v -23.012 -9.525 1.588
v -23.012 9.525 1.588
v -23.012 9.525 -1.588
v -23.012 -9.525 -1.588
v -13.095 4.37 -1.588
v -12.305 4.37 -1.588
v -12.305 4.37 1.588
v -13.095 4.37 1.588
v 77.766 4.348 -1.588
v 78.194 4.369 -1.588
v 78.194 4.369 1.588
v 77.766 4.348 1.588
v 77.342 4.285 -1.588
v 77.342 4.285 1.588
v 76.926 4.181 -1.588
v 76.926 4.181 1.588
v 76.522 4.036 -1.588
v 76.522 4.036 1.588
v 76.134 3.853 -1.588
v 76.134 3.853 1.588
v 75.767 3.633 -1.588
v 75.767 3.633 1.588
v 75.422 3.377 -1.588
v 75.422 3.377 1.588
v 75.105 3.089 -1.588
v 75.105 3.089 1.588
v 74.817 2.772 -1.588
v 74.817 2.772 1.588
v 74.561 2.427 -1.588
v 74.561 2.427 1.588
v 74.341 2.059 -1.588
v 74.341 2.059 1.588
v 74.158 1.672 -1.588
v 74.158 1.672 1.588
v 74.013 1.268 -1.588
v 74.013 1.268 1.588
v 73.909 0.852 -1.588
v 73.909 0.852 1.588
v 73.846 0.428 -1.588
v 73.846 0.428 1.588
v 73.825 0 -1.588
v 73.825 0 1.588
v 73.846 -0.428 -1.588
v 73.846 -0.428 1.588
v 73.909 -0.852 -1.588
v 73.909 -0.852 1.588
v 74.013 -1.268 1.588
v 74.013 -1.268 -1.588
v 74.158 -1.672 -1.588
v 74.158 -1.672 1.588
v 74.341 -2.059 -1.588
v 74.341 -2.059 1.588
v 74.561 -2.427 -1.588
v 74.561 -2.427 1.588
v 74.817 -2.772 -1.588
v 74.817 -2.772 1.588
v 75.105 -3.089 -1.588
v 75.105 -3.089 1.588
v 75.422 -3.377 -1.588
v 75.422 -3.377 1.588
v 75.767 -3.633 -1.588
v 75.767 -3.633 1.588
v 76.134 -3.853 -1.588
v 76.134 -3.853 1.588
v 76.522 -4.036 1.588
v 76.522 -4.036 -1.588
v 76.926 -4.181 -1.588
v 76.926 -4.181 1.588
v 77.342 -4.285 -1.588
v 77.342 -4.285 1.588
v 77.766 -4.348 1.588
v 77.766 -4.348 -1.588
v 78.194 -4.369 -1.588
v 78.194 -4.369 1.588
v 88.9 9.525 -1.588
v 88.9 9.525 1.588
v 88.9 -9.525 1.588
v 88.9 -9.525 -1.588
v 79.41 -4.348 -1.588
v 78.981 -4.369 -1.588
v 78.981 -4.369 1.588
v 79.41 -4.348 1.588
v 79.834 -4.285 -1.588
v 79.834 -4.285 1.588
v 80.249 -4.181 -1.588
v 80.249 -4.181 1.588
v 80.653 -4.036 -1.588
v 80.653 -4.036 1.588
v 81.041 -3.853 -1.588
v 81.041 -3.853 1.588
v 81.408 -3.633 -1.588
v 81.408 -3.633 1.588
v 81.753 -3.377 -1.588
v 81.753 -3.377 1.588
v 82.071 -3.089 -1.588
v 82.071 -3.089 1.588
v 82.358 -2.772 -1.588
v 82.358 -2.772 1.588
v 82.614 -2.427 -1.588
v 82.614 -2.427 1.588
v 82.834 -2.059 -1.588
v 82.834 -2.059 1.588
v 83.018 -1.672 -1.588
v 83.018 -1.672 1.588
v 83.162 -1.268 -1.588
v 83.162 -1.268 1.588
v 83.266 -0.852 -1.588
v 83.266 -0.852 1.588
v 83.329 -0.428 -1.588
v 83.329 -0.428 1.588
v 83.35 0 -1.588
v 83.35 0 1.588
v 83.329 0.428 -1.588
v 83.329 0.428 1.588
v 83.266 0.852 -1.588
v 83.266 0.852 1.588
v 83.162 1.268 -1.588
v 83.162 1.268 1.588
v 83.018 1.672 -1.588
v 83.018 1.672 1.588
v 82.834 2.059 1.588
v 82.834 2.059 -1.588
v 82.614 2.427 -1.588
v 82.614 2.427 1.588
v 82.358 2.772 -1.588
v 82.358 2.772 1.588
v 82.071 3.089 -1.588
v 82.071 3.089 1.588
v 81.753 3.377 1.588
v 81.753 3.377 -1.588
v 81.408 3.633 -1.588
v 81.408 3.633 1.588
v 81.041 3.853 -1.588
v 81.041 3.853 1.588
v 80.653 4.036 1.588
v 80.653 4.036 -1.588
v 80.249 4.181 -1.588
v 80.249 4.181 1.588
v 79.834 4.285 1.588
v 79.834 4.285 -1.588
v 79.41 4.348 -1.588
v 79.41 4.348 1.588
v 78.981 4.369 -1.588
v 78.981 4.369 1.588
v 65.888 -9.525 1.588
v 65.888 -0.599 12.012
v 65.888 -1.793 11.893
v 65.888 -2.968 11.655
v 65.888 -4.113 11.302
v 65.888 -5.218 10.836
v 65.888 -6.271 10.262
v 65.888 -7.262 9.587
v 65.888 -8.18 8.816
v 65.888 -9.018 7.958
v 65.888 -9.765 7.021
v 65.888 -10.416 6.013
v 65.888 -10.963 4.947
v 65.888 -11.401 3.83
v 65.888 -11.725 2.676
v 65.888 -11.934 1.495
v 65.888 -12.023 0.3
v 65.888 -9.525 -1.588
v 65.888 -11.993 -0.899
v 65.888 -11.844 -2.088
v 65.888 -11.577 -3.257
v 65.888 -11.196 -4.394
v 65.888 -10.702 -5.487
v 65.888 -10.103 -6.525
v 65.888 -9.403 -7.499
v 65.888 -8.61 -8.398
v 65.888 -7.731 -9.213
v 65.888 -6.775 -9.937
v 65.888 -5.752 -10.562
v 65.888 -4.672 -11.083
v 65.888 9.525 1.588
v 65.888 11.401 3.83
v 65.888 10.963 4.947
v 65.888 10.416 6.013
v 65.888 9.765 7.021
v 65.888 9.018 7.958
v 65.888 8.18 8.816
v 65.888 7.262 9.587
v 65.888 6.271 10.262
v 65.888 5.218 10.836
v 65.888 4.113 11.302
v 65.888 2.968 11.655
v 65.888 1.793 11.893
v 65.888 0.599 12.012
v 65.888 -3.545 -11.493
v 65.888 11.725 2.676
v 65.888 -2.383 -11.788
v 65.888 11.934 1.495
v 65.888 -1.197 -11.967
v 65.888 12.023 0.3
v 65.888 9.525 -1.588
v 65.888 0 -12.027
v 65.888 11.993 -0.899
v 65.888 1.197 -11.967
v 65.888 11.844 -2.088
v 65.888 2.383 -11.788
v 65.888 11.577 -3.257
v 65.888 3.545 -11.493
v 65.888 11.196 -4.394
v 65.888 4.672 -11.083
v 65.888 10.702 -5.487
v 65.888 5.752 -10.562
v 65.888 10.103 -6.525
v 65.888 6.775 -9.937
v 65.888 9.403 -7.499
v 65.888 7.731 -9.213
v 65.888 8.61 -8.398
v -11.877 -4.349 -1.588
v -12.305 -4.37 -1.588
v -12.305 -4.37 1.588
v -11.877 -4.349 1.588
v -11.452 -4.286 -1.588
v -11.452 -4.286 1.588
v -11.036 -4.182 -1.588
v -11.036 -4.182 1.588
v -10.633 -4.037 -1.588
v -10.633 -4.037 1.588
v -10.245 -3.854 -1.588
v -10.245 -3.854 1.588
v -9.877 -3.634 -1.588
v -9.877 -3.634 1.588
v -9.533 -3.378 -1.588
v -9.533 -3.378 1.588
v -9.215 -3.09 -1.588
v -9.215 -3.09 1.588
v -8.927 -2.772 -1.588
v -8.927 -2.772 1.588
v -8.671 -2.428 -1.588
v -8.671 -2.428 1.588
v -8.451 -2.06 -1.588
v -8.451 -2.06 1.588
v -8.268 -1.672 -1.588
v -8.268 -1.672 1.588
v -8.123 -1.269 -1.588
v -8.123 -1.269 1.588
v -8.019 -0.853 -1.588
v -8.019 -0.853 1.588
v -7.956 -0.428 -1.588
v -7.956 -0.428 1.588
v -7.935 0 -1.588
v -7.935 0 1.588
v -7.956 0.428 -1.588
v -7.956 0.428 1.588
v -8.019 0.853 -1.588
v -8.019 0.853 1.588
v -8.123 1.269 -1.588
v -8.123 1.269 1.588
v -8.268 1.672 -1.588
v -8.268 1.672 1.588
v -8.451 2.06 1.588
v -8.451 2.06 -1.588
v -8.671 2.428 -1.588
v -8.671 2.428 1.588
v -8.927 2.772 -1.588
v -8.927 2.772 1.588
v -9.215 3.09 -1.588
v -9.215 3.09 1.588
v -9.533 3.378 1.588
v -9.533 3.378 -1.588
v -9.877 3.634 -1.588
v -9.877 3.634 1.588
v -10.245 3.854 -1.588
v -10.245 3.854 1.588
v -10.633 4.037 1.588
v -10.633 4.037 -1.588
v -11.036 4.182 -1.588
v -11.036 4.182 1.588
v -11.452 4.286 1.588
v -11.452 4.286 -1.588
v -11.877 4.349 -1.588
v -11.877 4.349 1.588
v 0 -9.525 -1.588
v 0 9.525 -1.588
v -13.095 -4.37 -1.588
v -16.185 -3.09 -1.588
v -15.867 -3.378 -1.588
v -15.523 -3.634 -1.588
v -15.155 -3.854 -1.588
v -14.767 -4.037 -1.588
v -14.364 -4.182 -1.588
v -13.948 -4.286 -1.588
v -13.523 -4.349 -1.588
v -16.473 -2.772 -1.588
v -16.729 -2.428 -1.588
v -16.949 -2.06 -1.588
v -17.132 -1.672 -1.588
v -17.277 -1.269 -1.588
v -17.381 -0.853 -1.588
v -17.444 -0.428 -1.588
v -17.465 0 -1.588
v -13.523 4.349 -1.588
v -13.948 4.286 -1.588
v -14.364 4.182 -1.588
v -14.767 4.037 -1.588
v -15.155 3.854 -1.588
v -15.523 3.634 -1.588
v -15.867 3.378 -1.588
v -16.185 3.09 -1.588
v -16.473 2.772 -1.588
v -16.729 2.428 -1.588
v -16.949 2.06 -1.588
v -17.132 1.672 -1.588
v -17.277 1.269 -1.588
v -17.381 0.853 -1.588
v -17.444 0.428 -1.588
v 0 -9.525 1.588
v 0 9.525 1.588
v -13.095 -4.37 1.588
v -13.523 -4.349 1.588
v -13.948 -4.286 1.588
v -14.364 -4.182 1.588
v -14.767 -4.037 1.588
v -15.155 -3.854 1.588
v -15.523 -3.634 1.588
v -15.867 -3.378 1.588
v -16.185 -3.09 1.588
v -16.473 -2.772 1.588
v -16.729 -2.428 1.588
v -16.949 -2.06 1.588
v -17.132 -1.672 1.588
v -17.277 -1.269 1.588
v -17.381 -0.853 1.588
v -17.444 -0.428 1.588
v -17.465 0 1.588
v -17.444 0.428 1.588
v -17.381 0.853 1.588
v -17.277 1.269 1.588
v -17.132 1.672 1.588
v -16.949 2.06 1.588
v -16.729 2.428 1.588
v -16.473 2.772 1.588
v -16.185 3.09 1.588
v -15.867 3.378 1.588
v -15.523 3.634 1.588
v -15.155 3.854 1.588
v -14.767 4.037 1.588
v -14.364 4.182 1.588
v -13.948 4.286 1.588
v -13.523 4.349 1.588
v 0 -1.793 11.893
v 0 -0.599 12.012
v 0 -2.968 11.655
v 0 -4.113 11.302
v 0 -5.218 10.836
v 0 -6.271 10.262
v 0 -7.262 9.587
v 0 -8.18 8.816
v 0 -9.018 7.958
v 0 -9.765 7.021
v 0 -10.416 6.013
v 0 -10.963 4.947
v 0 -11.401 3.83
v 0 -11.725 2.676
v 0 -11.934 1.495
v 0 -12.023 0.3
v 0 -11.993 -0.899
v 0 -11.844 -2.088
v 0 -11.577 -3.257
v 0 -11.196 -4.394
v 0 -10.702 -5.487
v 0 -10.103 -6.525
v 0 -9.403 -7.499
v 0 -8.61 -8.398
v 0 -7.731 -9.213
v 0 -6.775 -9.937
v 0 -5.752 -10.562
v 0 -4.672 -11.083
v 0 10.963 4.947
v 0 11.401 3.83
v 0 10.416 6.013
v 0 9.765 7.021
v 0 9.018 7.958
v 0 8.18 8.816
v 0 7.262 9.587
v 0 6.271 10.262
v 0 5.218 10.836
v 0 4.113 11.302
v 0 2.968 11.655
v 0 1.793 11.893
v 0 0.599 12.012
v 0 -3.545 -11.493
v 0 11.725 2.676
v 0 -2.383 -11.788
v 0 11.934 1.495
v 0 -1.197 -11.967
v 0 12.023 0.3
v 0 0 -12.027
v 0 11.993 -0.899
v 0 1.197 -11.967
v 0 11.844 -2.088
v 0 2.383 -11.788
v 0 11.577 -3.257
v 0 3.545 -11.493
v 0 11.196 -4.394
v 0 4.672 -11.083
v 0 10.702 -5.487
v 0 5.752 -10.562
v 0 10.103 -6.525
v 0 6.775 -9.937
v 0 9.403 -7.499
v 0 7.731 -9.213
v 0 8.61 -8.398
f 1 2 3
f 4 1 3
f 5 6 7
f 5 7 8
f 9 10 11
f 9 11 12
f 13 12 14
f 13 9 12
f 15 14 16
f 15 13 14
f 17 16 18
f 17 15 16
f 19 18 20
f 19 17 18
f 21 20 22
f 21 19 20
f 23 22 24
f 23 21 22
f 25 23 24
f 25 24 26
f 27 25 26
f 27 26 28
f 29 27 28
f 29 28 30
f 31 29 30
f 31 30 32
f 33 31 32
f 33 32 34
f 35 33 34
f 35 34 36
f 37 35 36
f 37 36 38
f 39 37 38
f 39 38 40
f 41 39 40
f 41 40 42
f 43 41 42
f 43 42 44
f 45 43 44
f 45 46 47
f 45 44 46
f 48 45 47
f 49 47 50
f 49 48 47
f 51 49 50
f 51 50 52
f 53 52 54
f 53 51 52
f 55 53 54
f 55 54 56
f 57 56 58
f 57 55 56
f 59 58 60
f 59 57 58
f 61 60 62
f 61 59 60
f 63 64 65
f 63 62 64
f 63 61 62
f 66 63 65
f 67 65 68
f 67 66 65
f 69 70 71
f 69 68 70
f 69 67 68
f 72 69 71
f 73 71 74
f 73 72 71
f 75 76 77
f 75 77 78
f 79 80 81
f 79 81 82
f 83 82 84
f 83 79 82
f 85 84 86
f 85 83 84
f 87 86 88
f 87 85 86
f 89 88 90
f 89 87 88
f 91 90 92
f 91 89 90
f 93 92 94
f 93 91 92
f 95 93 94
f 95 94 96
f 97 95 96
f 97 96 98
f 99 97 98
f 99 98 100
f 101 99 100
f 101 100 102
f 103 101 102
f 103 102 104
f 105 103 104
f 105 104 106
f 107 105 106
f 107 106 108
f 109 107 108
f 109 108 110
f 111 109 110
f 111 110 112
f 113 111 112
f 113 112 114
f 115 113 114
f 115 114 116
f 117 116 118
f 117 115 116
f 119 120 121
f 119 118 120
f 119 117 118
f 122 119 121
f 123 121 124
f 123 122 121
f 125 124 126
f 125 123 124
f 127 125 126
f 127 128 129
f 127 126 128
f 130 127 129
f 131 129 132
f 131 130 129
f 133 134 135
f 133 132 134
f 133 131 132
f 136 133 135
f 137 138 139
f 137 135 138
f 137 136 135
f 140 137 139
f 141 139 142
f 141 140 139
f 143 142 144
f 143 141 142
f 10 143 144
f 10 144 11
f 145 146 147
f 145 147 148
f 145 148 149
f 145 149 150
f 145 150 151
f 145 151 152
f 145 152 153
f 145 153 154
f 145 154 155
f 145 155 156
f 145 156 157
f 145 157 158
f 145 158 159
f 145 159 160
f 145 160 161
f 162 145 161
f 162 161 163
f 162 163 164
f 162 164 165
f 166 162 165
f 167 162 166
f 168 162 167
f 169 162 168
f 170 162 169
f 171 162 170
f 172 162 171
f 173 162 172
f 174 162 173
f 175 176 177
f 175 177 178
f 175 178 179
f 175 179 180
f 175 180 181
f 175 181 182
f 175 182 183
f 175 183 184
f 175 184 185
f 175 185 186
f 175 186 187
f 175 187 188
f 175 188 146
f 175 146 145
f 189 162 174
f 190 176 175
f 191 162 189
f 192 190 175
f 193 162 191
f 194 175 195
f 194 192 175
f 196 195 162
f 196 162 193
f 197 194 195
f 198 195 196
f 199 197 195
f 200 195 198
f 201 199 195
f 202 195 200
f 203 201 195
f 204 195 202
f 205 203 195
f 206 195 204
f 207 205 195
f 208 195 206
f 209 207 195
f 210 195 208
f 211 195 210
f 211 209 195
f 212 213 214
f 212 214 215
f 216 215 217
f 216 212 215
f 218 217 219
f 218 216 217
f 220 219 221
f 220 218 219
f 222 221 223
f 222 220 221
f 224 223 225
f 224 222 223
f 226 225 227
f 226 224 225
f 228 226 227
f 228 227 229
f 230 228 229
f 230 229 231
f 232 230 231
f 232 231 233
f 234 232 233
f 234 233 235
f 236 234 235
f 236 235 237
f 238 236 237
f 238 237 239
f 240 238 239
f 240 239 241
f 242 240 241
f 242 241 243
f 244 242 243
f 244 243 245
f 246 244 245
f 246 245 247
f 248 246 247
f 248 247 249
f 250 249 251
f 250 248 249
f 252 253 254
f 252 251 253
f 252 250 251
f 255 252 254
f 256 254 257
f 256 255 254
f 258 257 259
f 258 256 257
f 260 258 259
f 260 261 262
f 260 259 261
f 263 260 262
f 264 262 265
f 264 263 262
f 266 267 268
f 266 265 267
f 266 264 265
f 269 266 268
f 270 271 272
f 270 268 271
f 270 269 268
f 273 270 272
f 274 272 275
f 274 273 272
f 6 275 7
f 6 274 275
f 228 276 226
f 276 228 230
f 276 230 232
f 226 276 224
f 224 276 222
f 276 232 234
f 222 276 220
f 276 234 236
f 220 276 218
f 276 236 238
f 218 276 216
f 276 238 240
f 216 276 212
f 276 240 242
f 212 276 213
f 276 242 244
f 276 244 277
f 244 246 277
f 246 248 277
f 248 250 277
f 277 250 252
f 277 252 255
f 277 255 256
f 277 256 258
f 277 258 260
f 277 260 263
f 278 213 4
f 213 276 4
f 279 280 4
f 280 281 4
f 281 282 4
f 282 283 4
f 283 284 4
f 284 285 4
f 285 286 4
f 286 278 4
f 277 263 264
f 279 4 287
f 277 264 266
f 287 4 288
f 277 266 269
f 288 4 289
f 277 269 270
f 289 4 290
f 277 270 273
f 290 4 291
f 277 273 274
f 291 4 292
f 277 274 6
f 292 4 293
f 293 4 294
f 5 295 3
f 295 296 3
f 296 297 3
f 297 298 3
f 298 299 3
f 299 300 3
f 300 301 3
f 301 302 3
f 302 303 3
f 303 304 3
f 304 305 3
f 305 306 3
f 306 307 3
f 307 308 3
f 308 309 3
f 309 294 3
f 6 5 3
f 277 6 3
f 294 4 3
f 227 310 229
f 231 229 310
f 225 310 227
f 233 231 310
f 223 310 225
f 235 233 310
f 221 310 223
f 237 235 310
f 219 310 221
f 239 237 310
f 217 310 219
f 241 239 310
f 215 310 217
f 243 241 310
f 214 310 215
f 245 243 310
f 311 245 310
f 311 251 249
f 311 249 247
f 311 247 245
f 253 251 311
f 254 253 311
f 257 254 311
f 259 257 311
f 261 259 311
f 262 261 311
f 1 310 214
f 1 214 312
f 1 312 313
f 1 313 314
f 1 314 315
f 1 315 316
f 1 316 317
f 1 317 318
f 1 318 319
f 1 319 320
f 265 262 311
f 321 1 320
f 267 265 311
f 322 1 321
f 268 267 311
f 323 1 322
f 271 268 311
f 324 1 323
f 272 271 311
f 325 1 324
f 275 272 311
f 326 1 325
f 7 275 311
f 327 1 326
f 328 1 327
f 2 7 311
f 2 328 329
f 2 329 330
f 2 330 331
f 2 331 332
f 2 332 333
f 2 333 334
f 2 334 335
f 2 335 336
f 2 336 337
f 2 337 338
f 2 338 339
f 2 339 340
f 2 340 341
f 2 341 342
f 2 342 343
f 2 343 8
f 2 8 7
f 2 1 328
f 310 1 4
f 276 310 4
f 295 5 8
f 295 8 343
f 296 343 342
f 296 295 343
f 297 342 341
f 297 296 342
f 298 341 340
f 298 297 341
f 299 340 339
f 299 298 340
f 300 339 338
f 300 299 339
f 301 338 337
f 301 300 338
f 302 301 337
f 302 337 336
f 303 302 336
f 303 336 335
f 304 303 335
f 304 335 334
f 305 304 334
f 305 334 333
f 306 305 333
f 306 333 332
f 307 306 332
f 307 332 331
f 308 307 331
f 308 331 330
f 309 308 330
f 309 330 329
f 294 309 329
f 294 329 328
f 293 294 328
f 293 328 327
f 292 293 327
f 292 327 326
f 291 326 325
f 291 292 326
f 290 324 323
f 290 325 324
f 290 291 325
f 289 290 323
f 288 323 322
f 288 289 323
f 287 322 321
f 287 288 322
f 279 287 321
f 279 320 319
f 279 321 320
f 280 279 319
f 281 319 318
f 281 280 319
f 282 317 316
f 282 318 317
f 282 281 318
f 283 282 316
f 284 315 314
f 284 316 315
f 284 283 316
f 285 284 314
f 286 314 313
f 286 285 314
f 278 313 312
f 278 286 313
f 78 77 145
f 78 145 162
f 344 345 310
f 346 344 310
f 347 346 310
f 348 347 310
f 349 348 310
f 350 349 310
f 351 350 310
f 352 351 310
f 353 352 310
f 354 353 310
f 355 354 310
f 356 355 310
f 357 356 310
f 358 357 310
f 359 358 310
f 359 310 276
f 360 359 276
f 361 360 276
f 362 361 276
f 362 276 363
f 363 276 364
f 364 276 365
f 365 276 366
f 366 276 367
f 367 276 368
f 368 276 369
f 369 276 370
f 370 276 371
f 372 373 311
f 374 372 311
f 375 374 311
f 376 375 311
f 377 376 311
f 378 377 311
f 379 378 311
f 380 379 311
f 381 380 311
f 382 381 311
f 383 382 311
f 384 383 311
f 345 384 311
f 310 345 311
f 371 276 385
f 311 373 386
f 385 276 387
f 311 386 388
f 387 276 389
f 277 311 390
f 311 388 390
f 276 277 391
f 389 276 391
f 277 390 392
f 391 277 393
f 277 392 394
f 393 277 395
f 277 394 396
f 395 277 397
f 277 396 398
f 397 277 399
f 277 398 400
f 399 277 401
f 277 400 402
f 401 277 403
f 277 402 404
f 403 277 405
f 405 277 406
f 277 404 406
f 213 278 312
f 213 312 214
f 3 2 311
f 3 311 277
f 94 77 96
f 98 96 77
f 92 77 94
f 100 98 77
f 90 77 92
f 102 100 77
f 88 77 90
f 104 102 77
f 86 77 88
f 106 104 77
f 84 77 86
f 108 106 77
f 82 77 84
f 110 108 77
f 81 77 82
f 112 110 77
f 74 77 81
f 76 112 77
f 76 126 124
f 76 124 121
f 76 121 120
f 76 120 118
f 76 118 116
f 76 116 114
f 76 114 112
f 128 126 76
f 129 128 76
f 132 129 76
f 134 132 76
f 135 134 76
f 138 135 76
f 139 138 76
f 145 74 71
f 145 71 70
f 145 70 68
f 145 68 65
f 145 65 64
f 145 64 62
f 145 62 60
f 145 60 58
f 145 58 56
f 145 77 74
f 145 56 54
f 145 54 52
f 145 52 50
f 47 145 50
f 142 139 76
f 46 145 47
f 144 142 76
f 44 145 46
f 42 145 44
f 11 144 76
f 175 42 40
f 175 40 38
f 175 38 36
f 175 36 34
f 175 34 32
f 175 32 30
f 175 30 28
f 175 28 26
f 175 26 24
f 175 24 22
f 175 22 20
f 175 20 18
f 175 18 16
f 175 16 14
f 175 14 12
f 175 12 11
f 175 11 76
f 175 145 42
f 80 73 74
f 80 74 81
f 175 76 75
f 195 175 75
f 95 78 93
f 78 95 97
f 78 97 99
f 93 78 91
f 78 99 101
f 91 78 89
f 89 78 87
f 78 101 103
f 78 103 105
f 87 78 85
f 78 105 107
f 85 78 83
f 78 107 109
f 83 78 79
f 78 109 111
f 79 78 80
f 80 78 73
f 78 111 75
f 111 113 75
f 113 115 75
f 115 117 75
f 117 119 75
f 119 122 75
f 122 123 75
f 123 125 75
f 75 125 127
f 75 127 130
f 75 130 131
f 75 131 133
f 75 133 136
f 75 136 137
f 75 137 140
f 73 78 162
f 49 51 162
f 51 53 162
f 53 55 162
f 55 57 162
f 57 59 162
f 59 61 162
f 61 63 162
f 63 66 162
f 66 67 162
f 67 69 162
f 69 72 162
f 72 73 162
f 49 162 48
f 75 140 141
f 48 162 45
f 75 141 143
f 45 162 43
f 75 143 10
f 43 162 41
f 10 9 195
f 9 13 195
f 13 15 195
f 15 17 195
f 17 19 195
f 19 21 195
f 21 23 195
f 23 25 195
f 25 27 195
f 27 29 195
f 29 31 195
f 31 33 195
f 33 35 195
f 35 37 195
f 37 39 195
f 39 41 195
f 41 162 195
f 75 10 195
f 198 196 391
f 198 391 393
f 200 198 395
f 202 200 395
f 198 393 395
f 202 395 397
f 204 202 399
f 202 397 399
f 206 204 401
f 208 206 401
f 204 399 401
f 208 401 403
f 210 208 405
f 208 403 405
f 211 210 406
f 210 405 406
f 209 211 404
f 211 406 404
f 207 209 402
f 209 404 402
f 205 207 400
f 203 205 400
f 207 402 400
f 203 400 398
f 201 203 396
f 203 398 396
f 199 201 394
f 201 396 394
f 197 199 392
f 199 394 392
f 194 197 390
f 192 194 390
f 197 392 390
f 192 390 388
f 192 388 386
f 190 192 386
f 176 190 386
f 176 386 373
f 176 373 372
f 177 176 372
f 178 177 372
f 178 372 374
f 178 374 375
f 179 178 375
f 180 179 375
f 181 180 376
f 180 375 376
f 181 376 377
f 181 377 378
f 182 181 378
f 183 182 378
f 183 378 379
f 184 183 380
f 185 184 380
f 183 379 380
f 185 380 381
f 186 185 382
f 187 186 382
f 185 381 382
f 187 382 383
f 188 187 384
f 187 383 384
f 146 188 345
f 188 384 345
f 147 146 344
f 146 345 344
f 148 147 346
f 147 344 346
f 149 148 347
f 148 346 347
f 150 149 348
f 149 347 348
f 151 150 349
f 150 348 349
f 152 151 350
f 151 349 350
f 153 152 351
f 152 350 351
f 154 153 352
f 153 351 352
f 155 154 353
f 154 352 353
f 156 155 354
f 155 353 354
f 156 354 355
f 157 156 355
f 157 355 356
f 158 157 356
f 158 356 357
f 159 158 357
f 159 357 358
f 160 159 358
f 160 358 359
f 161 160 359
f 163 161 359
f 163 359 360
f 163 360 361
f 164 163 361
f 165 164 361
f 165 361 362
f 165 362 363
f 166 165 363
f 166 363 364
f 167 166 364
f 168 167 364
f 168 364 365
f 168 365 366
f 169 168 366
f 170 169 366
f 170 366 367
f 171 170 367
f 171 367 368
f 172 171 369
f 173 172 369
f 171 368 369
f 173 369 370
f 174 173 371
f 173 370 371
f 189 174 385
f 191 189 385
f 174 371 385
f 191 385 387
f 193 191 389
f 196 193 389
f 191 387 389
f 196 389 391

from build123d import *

# Parameters (mm, degrees)
SKETCH1_R                = 12.0269
BOSS_EXTRUDE1_DEPTH      = 65.8876
BOSS_EXTRUDE2_DEPTH      = 23.0124
BOSS_EXTRUDE2_DEPTH_BACK = 88.9
SKETCH2_W                = 3.175
SKETCH2_H                = 19.05
CUT_EXTRUDE1_DEPTH       = 23.0124
CUT_EXTRUDE2_DEPTH       = 23.0124


with BuildPart() as part:
    # Sketch1 → Boss-Extrude1 (new body)
    with BuildSketch(Plane(origin=(0, 0, 0), x_dir=(0, 0, -1), z_dir=(1, 0, 0))):
        Circle(SKETCH1_R)
    extrude(amount=BOSS_EXTRUDE1_DEPTH)

    # Sketch2 → Boss-Extrude2 (add, two sides: drawn at the far end of the back side and taken through both)
    with BuildSketch(Plane(origin=(65.8876, 0, 0), x_dir=(0, 0, -1), z_dir=(1, 0, 0)).offset(-BOSS_EXTRUDE2_DEPTH_BACK)):
        Rectangle(SKETCH2_W, SKETCH2_H)
    extrude(amount=BOSS_EXTRUDE2_DEPTH + BOSS_EXTRUDE2_DEPTH_BACK)

    # Sketch5 → Cut-Extrude1 (cut)
    with BuildSketch(Plane(origin=(0, 0, -1.5875), x_dir=(-1, 0, 0), z_dir=(0, 0, -1))):
        with BuildLine():
            Line((-78.9813, 4.3688), (-78.1939, 4.3688))
            ThreePointArc((-78.1939, 4.3688), (-73.8251, 0), (-78.1939, -4.3688))
            Line((-78.1939, -4.3688), (-78.9813, -4.3688))
            ThreePointArc((-78.9813, -4.3688), (-83.3501, 0), (-78.9813, 4.3688))
        make_face()
    extrude(amount=-CUT_EXTRUDE1_DEPTH, mode=Mode.SUBTRACT)

    # Sketch6 → Cut-Extrude2 (cut)
    with BuildSketch(Plane(origin=(0, 0, -1.5875), x_dir=(-1, 0, 0), z_dir=(0, 0, -1))):
        with BuildLine():
            Line((13.095, -4.37), (12.305, -4.37))
            ThreePointArc((12.305, -4.37), (7.935, 0), (12.305, 4.37))
            Line((12.305, 4.37), (13.095, 4.37))
            ThreePointArc((13.095, 4.37), (17.465, 0), (13.095, -4.37))
        make_face()
    extrude(amount=-CUT_EXTRUDE2_DEPTH, mode=Mode.SUBTRACT)


solid = part.part
